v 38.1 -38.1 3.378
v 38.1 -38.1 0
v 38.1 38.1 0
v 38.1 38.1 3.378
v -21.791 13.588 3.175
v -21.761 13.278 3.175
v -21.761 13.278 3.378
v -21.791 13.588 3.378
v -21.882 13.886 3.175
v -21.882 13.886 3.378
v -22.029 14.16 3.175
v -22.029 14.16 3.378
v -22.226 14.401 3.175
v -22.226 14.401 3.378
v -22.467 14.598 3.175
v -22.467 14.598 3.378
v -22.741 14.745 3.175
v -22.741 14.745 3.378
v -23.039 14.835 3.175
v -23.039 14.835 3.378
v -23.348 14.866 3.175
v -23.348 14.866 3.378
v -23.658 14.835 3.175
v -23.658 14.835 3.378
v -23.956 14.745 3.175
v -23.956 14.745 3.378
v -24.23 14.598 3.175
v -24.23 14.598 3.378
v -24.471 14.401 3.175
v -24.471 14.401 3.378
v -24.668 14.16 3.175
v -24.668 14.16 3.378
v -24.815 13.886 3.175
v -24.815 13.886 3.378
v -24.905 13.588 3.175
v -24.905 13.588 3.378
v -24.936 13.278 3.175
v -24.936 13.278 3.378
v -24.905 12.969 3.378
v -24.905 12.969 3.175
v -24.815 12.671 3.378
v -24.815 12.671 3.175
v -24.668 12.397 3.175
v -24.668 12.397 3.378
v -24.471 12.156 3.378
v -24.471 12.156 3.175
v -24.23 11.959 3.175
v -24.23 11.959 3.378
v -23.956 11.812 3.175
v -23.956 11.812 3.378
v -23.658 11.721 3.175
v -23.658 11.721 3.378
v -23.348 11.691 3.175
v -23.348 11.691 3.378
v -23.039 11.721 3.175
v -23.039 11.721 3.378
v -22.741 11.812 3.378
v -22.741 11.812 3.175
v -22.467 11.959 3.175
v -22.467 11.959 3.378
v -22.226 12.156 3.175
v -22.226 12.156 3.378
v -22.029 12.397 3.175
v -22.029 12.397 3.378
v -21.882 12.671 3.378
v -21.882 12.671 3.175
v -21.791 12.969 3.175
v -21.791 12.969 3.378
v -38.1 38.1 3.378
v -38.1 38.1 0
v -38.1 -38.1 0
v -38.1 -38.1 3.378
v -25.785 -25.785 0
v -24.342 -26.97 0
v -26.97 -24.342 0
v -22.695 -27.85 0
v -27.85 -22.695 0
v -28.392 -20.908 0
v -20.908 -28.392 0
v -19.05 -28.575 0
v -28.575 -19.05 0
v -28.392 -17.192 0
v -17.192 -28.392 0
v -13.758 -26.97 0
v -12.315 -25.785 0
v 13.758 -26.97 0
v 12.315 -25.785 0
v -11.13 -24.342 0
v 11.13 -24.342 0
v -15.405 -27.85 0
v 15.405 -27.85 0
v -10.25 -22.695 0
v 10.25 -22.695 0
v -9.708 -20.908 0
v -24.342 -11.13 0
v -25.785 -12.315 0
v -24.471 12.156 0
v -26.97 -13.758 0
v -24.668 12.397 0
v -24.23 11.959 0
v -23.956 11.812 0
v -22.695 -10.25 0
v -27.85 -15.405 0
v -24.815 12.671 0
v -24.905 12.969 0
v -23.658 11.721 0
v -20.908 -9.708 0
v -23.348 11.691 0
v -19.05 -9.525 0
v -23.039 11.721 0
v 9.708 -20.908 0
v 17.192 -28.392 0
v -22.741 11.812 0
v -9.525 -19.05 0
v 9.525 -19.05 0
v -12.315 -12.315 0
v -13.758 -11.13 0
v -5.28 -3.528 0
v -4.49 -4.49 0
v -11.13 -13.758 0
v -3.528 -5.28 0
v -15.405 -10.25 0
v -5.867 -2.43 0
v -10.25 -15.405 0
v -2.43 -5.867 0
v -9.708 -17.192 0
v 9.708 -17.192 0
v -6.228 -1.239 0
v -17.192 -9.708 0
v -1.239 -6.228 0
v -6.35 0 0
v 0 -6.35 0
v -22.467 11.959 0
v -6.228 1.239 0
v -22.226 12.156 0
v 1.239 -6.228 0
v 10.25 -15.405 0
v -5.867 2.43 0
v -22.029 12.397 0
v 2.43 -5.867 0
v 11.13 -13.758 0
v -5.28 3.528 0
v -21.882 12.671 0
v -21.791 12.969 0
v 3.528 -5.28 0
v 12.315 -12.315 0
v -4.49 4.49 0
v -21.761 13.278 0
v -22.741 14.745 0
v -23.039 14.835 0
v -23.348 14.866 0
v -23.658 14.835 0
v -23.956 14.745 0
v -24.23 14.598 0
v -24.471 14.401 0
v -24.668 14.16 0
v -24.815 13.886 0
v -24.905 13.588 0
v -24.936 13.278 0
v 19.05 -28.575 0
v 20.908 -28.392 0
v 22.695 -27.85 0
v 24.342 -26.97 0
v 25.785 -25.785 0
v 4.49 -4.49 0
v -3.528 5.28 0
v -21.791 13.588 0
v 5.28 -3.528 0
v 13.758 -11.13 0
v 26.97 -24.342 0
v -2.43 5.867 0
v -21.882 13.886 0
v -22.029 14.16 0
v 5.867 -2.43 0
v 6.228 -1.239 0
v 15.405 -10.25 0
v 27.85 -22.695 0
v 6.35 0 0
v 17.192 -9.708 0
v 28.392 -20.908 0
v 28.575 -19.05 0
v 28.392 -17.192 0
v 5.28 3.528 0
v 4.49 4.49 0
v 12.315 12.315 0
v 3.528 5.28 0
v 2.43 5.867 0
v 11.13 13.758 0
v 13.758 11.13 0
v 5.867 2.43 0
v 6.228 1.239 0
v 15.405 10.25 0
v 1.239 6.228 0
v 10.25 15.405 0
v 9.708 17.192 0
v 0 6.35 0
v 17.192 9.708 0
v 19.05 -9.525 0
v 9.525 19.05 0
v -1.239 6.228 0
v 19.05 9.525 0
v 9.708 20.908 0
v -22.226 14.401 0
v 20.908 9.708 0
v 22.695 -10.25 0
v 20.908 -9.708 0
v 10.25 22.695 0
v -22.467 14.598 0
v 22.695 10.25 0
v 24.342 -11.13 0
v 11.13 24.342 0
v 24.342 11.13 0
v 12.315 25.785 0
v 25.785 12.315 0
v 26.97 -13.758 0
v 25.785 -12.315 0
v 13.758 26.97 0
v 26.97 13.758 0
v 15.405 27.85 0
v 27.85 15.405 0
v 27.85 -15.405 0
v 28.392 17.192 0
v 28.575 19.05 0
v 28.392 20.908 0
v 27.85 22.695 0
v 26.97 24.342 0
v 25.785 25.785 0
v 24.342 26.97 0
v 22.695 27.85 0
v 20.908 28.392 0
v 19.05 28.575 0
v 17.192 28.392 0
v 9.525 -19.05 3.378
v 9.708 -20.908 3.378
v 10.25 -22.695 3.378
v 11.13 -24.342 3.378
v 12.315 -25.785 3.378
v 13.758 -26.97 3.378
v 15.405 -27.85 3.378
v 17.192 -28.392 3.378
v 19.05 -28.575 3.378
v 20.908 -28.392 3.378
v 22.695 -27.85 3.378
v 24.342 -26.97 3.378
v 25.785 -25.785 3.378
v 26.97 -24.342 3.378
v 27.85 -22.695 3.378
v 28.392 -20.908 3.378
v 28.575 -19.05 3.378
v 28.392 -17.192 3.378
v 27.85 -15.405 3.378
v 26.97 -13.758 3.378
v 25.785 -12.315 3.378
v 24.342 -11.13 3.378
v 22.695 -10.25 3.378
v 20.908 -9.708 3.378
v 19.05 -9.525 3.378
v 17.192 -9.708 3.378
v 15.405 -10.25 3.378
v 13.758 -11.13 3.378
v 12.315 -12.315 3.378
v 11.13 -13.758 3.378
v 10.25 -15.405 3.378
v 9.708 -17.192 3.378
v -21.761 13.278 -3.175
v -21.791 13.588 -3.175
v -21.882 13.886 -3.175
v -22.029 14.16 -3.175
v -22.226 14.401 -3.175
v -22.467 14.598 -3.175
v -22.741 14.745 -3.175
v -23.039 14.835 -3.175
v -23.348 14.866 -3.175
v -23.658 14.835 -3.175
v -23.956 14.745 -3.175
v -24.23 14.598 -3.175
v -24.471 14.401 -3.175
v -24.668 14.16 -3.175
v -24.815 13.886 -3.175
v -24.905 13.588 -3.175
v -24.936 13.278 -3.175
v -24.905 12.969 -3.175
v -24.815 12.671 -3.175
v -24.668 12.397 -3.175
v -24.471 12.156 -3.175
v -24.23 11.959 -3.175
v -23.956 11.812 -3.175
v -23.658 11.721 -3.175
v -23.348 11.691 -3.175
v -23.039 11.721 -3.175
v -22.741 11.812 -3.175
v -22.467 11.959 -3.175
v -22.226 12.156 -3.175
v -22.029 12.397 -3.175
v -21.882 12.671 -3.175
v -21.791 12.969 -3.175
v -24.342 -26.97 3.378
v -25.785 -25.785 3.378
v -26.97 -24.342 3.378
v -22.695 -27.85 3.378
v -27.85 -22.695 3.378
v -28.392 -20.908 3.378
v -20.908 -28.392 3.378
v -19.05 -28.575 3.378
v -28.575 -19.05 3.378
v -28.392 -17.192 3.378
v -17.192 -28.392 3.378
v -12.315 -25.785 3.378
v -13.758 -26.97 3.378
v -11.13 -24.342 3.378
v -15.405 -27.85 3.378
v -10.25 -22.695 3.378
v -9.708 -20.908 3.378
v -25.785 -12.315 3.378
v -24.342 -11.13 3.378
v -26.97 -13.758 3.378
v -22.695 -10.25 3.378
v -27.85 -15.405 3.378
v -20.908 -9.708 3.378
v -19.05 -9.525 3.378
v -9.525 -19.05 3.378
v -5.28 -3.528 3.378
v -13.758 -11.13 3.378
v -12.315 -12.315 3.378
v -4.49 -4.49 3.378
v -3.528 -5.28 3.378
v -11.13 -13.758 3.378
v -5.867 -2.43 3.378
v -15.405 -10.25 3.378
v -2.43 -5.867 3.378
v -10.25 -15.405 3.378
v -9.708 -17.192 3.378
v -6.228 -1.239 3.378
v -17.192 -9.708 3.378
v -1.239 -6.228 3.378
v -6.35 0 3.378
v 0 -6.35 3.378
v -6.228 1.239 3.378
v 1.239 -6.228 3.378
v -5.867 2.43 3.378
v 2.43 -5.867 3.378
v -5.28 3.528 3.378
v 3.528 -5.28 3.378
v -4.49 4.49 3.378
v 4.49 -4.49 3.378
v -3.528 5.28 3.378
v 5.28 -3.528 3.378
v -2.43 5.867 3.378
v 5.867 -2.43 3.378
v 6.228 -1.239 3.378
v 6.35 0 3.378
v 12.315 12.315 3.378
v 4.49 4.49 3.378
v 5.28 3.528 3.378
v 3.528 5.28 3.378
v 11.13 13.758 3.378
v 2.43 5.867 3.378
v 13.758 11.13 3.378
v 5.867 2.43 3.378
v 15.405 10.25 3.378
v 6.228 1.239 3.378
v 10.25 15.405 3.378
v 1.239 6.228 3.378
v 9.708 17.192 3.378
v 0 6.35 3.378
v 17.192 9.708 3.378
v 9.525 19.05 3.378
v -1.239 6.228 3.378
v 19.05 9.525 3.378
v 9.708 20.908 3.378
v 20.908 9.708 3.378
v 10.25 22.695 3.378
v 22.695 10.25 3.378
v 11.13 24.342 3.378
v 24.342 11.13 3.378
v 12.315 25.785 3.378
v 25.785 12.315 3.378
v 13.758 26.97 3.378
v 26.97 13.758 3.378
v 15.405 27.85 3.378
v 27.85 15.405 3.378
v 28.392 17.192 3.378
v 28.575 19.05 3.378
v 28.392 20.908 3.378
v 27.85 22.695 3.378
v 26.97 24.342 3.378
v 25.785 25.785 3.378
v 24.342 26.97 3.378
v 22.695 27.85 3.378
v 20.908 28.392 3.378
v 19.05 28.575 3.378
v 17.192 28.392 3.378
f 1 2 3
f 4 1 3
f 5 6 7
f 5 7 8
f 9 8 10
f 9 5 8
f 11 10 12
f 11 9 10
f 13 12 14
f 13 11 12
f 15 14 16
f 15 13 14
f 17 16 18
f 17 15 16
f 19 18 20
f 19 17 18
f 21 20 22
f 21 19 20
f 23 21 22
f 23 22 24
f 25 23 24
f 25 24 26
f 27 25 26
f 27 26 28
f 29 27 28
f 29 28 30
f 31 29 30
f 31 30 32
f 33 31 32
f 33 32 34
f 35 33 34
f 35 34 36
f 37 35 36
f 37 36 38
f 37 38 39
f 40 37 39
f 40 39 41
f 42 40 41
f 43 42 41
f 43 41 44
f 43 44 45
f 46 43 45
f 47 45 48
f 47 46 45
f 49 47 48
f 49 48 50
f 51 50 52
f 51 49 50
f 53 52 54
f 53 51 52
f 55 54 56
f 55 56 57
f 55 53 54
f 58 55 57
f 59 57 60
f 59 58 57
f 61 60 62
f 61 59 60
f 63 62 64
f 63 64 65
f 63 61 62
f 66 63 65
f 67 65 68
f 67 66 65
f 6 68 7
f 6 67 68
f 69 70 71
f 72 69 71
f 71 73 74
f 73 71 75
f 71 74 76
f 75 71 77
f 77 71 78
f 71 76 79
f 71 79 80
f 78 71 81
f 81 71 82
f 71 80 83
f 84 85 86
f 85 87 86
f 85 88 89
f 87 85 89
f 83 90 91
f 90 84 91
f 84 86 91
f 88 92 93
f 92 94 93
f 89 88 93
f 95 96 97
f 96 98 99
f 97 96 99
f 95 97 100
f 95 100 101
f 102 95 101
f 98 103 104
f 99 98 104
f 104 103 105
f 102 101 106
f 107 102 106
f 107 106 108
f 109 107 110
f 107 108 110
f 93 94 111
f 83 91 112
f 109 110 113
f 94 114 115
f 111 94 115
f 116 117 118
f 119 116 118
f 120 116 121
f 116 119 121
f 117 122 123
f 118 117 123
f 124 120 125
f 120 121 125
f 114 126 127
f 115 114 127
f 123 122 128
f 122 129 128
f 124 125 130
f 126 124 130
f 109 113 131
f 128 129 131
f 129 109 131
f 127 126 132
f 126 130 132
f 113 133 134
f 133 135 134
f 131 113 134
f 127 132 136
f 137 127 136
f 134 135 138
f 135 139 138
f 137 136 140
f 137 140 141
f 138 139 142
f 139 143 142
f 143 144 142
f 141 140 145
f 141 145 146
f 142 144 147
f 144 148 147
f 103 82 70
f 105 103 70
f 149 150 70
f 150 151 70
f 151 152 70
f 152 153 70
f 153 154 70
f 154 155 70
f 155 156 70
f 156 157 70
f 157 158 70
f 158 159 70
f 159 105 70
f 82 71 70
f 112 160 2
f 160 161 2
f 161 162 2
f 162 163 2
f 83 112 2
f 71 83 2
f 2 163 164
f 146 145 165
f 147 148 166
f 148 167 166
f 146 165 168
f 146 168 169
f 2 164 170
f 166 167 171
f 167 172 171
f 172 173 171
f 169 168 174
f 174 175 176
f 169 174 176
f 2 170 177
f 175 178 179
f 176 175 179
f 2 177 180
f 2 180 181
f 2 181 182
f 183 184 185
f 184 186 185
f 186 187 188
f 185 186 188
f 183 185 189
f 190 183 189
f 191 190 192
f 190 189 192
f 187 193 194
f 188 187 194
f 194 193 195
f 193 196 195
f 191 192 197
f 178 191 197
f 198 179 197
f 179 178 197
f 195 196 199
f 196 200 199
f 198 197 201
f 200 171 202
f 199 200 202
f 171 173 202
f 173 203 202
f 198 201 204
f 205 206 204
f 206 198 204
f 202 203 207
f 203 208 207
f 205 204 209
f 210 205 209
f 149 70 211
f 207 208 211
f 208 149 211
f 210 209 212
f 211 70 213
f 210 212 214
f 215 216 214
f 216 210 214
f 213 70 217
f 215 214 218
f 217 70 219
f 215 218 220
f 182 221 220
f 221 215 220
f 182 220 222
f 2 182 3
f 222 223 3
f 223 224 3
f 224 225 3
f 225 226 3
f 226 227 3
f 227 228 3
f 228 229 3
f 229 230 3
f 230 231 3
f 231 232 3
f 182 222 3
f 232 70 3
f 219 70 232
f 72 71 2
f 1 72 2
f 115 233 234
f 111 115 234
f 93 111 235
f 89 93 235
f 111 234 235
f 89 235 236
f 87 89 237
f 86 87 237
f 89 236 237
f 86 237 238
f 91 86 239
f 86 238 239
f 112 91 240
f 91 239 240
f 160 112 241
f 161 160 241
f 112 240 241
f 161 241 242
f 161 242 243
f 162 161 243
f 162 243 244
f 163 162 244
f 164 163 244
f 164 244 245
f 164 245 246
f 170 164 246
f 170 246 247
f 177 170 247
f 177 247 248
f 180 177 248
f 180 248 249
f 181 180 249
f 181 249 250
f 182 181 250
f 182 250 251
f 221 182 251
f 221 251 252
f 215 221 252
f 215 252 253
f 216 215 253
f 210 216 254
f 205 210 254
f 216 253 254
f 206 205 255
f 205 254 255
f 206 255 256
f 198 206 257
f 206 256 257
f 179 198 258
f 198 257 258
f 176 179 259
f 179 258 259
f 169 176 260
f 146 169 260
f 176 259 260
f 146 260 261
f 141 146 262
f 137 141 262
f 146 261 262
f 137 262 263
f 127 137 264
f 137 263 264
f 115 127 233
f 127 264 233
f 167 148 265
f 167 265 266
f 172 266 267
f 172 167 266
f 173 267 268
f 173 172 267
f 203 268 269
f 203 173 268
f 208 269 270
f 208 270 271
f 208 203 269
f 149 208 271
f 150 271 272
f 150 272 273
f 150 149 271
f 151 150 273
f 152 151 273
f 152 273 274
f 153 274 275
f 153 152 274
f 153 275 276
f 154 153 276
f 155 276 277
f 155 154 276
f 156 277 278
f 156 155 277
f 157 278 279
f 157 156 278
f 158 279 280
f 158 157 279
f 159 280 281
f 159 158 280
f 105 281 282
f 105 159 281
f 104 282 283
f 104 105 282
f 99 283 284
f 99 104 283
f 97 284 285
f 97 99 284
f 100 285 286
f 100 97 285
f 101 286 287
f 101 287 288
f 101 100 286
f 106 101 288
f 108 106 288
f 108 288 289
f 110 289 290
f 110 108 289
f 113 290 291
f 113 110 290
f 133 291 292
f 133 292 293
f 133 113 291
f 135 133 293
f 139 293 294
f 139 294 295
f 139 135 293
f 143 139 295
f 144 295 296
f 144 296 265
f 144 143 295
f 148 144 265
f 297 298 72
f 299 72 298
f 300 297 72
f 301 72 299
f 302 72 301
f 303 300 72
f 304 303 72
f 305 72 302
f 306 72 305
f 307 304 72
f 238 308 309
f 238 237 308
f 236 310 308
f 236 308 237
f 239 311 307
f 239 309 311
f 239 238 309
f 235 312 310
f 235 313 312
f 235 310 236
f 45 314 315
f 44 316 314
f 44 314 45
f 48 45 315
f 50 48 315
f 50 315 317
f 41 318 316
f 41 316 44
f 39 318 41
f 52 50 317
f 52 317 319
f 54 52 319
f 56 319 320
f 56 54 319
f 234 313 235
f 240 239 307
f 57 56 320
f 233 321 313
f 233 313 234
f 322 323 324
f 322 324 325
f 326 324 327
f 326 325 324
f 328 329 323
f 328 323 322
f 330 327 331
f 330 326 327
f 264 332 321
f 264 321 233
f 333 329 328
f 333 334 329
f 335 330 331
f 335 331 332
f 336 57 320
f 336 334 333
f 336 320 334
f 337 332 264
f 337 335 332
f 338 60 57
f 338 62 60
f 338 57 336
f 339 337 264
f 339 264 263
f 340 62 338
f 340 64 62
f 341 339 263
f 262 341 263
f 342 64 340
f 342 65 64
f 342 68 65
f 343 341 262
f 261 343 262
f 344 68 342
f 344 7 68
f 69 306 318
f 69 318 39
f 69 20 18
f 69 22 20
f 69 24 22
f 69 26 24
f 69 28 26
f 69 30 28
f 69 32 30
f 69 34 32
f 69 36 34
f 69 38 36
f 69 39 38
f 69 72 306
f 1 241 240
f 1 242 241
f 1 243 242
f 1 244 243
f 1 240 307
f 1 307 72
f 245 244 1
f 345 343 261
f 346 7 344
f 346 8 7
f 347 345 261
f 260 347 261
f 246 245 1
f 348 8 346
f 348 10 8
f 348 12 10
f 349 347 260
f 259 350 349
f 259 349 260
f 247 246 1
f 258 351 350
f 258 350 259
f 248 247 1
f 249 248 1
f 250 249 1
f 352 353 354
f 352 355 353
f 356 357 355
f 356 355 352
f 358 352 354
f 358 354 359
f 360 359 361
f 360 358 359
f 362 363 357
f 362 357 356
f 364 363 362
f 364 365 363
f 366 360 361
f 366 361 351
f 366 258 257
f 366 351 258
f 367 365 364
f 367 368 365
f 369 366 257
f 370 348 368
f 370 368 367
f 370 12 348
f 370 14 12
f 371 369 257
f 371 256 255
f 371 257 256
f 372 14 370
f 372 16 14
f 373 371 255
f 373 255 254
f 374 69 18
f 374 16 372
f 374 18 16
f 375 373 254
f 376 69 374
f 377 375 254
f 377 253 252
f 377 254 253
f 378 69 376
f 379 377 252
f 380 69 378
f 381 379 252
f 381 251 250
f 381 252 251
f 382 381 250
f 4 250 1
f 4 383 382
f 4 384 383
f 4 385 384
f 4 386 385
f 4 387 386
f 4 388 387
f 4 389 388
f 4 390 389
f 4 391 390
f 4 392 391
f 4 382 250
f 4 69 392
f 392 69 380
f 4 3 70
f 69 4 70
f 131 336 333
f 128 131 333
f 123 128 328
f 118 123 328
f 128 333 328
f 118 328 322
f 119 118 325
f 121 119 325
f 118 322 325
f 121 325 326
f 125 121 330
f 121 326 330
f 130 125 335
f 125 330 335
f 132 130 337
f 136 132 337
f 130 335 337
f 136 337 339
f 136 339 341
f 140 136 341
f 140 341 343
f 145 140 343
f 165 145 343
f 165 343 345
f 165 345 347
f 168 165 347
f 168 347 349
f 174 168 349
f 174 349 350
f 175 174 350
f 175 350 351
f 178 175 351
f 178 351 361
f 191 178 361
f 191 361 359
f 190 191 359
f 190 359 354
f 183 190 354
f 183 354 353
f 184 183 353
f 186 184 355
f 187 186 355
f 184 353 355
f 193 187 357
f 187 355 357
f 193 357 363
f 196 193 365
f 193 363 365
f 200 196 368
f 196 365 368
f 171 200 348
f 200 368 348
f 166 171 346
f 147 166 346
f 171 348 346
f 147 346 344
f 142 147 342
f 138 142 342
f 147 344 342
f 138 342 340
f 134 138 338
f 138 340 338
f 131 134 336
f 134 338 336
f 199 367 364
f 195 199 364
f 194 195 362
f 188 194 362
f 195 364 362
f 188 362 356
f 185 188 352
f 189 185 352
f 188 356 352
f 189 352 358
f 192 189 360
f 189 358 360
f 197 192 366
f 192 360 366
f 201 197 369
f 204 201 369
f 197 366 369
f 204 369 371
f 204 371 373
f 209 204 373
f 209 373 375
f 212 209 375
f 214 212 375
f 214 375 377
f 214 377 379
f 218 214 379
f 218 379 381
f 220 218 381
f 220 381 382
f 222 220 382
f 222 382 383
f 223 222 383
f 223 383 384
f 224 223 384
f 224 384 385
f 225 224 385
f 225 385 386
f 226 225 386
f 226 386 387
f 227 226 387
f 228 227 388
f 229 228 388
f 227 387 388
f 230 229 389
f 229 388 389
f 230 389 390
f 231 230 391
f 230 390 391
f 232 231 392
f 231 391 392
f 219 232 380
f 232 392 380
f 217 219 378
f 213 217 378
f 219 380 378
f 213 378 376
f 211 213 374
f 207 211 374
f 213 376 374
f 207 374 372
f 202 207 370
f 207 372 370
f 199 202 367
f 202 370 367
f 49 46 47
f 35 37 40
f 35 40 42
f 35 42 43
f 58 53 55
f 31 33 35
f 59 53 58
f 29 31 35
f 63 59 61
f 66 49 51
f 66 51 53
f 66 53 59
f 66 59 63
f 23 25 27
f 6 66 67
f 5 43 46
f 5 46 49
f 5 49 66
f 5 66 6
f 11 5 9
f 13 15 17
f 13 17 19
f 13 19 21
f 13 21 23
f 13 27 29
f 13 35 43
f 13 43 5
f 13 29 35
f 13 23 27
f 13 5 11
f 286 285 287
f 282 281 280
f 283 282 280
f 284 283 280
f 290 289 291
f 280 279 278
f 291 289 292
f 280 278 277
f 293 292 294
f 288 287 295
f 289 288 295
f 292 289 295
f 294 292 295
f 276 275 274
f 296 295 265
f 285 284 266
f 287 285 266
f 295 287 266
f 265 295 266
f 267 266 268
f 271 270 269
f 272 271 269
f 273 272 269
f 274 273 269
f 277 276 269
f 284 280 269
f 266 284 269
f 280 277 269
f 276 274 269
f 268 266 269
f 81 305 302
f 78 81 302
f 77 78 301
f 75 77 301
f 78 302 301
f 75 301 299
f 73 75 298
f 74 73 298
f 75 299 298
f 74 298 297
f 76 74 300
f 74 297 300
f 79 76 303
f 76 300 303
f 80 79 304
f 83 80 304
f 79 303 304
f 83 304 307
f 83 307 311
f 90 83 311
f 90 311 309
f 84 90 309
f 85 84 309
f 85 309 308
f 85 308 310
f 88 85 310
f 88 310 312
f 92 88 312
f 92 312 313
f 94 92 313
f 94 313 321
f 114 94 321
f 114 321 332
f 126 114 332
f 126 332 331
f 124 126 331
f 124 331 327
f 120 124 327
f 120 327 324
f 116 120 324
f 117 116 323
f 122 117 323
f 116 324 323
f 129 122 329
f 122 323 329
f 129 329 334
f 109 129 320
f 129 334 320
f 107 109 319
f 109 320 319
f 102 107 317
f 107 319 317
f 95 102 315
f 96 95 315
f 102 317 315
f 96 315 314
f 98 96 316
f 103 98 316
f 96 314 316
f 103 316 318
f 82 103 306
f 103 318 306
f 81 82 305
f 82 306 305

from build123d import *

# Parameters (mm, degrees)
F0_R     = 1.5875
F1_DEPTH = 3.3782
F2_D     = 19.05
F3_D     = 12.7
F4_DEPTH = 3.175


# Not quite as in the source:
# - a feature names something its author has since deleted; it is built from what else it names


with BuildPart() as f1:
    # F0 (on Top) → F1 (new body)
    with BuildSketch(Plane.XY):
        Polygon((38.1, 38.1), (-38.1, 38.1), (-38.1, -38.1), (0, -38.1), (38.1, -38.1), (38.1, 0), align=None)
        with Locations((-23.3484897763, 13.2784806192)):
            Circle(F0_R, mode=Mode.SUBTRACT)
    extrude(amount=F1_DEPTH)

    # F2 (through all)
    with Locations(Plane(origin=(0, 0, 0), x_dir=(1, 0, 0), z_dir=(0, 0, -1))):
        with Locations((19.05, -19.05), (19.05, 19.05), (-19.05, 19.05)):
            Hole(F2_D / 2)

    # F3 (through all)
    with Locations(Plane(origin=(0, 0, 0), x_dir=(1, 0, 0), z_dir=(0, 0, -1))):
        with Locations((0, 0)):
            Hole(F3_D / 2)

    # F0 (on Top) → F4 (join, symmetric)
    with BuildSketch(Plane.XY):
        with Locations((-23.3484897763, 13.2784806192)):
            Circle(F0_R)
    extrude(amount=F4_DEPTH, both=True)


solid = f1.part
